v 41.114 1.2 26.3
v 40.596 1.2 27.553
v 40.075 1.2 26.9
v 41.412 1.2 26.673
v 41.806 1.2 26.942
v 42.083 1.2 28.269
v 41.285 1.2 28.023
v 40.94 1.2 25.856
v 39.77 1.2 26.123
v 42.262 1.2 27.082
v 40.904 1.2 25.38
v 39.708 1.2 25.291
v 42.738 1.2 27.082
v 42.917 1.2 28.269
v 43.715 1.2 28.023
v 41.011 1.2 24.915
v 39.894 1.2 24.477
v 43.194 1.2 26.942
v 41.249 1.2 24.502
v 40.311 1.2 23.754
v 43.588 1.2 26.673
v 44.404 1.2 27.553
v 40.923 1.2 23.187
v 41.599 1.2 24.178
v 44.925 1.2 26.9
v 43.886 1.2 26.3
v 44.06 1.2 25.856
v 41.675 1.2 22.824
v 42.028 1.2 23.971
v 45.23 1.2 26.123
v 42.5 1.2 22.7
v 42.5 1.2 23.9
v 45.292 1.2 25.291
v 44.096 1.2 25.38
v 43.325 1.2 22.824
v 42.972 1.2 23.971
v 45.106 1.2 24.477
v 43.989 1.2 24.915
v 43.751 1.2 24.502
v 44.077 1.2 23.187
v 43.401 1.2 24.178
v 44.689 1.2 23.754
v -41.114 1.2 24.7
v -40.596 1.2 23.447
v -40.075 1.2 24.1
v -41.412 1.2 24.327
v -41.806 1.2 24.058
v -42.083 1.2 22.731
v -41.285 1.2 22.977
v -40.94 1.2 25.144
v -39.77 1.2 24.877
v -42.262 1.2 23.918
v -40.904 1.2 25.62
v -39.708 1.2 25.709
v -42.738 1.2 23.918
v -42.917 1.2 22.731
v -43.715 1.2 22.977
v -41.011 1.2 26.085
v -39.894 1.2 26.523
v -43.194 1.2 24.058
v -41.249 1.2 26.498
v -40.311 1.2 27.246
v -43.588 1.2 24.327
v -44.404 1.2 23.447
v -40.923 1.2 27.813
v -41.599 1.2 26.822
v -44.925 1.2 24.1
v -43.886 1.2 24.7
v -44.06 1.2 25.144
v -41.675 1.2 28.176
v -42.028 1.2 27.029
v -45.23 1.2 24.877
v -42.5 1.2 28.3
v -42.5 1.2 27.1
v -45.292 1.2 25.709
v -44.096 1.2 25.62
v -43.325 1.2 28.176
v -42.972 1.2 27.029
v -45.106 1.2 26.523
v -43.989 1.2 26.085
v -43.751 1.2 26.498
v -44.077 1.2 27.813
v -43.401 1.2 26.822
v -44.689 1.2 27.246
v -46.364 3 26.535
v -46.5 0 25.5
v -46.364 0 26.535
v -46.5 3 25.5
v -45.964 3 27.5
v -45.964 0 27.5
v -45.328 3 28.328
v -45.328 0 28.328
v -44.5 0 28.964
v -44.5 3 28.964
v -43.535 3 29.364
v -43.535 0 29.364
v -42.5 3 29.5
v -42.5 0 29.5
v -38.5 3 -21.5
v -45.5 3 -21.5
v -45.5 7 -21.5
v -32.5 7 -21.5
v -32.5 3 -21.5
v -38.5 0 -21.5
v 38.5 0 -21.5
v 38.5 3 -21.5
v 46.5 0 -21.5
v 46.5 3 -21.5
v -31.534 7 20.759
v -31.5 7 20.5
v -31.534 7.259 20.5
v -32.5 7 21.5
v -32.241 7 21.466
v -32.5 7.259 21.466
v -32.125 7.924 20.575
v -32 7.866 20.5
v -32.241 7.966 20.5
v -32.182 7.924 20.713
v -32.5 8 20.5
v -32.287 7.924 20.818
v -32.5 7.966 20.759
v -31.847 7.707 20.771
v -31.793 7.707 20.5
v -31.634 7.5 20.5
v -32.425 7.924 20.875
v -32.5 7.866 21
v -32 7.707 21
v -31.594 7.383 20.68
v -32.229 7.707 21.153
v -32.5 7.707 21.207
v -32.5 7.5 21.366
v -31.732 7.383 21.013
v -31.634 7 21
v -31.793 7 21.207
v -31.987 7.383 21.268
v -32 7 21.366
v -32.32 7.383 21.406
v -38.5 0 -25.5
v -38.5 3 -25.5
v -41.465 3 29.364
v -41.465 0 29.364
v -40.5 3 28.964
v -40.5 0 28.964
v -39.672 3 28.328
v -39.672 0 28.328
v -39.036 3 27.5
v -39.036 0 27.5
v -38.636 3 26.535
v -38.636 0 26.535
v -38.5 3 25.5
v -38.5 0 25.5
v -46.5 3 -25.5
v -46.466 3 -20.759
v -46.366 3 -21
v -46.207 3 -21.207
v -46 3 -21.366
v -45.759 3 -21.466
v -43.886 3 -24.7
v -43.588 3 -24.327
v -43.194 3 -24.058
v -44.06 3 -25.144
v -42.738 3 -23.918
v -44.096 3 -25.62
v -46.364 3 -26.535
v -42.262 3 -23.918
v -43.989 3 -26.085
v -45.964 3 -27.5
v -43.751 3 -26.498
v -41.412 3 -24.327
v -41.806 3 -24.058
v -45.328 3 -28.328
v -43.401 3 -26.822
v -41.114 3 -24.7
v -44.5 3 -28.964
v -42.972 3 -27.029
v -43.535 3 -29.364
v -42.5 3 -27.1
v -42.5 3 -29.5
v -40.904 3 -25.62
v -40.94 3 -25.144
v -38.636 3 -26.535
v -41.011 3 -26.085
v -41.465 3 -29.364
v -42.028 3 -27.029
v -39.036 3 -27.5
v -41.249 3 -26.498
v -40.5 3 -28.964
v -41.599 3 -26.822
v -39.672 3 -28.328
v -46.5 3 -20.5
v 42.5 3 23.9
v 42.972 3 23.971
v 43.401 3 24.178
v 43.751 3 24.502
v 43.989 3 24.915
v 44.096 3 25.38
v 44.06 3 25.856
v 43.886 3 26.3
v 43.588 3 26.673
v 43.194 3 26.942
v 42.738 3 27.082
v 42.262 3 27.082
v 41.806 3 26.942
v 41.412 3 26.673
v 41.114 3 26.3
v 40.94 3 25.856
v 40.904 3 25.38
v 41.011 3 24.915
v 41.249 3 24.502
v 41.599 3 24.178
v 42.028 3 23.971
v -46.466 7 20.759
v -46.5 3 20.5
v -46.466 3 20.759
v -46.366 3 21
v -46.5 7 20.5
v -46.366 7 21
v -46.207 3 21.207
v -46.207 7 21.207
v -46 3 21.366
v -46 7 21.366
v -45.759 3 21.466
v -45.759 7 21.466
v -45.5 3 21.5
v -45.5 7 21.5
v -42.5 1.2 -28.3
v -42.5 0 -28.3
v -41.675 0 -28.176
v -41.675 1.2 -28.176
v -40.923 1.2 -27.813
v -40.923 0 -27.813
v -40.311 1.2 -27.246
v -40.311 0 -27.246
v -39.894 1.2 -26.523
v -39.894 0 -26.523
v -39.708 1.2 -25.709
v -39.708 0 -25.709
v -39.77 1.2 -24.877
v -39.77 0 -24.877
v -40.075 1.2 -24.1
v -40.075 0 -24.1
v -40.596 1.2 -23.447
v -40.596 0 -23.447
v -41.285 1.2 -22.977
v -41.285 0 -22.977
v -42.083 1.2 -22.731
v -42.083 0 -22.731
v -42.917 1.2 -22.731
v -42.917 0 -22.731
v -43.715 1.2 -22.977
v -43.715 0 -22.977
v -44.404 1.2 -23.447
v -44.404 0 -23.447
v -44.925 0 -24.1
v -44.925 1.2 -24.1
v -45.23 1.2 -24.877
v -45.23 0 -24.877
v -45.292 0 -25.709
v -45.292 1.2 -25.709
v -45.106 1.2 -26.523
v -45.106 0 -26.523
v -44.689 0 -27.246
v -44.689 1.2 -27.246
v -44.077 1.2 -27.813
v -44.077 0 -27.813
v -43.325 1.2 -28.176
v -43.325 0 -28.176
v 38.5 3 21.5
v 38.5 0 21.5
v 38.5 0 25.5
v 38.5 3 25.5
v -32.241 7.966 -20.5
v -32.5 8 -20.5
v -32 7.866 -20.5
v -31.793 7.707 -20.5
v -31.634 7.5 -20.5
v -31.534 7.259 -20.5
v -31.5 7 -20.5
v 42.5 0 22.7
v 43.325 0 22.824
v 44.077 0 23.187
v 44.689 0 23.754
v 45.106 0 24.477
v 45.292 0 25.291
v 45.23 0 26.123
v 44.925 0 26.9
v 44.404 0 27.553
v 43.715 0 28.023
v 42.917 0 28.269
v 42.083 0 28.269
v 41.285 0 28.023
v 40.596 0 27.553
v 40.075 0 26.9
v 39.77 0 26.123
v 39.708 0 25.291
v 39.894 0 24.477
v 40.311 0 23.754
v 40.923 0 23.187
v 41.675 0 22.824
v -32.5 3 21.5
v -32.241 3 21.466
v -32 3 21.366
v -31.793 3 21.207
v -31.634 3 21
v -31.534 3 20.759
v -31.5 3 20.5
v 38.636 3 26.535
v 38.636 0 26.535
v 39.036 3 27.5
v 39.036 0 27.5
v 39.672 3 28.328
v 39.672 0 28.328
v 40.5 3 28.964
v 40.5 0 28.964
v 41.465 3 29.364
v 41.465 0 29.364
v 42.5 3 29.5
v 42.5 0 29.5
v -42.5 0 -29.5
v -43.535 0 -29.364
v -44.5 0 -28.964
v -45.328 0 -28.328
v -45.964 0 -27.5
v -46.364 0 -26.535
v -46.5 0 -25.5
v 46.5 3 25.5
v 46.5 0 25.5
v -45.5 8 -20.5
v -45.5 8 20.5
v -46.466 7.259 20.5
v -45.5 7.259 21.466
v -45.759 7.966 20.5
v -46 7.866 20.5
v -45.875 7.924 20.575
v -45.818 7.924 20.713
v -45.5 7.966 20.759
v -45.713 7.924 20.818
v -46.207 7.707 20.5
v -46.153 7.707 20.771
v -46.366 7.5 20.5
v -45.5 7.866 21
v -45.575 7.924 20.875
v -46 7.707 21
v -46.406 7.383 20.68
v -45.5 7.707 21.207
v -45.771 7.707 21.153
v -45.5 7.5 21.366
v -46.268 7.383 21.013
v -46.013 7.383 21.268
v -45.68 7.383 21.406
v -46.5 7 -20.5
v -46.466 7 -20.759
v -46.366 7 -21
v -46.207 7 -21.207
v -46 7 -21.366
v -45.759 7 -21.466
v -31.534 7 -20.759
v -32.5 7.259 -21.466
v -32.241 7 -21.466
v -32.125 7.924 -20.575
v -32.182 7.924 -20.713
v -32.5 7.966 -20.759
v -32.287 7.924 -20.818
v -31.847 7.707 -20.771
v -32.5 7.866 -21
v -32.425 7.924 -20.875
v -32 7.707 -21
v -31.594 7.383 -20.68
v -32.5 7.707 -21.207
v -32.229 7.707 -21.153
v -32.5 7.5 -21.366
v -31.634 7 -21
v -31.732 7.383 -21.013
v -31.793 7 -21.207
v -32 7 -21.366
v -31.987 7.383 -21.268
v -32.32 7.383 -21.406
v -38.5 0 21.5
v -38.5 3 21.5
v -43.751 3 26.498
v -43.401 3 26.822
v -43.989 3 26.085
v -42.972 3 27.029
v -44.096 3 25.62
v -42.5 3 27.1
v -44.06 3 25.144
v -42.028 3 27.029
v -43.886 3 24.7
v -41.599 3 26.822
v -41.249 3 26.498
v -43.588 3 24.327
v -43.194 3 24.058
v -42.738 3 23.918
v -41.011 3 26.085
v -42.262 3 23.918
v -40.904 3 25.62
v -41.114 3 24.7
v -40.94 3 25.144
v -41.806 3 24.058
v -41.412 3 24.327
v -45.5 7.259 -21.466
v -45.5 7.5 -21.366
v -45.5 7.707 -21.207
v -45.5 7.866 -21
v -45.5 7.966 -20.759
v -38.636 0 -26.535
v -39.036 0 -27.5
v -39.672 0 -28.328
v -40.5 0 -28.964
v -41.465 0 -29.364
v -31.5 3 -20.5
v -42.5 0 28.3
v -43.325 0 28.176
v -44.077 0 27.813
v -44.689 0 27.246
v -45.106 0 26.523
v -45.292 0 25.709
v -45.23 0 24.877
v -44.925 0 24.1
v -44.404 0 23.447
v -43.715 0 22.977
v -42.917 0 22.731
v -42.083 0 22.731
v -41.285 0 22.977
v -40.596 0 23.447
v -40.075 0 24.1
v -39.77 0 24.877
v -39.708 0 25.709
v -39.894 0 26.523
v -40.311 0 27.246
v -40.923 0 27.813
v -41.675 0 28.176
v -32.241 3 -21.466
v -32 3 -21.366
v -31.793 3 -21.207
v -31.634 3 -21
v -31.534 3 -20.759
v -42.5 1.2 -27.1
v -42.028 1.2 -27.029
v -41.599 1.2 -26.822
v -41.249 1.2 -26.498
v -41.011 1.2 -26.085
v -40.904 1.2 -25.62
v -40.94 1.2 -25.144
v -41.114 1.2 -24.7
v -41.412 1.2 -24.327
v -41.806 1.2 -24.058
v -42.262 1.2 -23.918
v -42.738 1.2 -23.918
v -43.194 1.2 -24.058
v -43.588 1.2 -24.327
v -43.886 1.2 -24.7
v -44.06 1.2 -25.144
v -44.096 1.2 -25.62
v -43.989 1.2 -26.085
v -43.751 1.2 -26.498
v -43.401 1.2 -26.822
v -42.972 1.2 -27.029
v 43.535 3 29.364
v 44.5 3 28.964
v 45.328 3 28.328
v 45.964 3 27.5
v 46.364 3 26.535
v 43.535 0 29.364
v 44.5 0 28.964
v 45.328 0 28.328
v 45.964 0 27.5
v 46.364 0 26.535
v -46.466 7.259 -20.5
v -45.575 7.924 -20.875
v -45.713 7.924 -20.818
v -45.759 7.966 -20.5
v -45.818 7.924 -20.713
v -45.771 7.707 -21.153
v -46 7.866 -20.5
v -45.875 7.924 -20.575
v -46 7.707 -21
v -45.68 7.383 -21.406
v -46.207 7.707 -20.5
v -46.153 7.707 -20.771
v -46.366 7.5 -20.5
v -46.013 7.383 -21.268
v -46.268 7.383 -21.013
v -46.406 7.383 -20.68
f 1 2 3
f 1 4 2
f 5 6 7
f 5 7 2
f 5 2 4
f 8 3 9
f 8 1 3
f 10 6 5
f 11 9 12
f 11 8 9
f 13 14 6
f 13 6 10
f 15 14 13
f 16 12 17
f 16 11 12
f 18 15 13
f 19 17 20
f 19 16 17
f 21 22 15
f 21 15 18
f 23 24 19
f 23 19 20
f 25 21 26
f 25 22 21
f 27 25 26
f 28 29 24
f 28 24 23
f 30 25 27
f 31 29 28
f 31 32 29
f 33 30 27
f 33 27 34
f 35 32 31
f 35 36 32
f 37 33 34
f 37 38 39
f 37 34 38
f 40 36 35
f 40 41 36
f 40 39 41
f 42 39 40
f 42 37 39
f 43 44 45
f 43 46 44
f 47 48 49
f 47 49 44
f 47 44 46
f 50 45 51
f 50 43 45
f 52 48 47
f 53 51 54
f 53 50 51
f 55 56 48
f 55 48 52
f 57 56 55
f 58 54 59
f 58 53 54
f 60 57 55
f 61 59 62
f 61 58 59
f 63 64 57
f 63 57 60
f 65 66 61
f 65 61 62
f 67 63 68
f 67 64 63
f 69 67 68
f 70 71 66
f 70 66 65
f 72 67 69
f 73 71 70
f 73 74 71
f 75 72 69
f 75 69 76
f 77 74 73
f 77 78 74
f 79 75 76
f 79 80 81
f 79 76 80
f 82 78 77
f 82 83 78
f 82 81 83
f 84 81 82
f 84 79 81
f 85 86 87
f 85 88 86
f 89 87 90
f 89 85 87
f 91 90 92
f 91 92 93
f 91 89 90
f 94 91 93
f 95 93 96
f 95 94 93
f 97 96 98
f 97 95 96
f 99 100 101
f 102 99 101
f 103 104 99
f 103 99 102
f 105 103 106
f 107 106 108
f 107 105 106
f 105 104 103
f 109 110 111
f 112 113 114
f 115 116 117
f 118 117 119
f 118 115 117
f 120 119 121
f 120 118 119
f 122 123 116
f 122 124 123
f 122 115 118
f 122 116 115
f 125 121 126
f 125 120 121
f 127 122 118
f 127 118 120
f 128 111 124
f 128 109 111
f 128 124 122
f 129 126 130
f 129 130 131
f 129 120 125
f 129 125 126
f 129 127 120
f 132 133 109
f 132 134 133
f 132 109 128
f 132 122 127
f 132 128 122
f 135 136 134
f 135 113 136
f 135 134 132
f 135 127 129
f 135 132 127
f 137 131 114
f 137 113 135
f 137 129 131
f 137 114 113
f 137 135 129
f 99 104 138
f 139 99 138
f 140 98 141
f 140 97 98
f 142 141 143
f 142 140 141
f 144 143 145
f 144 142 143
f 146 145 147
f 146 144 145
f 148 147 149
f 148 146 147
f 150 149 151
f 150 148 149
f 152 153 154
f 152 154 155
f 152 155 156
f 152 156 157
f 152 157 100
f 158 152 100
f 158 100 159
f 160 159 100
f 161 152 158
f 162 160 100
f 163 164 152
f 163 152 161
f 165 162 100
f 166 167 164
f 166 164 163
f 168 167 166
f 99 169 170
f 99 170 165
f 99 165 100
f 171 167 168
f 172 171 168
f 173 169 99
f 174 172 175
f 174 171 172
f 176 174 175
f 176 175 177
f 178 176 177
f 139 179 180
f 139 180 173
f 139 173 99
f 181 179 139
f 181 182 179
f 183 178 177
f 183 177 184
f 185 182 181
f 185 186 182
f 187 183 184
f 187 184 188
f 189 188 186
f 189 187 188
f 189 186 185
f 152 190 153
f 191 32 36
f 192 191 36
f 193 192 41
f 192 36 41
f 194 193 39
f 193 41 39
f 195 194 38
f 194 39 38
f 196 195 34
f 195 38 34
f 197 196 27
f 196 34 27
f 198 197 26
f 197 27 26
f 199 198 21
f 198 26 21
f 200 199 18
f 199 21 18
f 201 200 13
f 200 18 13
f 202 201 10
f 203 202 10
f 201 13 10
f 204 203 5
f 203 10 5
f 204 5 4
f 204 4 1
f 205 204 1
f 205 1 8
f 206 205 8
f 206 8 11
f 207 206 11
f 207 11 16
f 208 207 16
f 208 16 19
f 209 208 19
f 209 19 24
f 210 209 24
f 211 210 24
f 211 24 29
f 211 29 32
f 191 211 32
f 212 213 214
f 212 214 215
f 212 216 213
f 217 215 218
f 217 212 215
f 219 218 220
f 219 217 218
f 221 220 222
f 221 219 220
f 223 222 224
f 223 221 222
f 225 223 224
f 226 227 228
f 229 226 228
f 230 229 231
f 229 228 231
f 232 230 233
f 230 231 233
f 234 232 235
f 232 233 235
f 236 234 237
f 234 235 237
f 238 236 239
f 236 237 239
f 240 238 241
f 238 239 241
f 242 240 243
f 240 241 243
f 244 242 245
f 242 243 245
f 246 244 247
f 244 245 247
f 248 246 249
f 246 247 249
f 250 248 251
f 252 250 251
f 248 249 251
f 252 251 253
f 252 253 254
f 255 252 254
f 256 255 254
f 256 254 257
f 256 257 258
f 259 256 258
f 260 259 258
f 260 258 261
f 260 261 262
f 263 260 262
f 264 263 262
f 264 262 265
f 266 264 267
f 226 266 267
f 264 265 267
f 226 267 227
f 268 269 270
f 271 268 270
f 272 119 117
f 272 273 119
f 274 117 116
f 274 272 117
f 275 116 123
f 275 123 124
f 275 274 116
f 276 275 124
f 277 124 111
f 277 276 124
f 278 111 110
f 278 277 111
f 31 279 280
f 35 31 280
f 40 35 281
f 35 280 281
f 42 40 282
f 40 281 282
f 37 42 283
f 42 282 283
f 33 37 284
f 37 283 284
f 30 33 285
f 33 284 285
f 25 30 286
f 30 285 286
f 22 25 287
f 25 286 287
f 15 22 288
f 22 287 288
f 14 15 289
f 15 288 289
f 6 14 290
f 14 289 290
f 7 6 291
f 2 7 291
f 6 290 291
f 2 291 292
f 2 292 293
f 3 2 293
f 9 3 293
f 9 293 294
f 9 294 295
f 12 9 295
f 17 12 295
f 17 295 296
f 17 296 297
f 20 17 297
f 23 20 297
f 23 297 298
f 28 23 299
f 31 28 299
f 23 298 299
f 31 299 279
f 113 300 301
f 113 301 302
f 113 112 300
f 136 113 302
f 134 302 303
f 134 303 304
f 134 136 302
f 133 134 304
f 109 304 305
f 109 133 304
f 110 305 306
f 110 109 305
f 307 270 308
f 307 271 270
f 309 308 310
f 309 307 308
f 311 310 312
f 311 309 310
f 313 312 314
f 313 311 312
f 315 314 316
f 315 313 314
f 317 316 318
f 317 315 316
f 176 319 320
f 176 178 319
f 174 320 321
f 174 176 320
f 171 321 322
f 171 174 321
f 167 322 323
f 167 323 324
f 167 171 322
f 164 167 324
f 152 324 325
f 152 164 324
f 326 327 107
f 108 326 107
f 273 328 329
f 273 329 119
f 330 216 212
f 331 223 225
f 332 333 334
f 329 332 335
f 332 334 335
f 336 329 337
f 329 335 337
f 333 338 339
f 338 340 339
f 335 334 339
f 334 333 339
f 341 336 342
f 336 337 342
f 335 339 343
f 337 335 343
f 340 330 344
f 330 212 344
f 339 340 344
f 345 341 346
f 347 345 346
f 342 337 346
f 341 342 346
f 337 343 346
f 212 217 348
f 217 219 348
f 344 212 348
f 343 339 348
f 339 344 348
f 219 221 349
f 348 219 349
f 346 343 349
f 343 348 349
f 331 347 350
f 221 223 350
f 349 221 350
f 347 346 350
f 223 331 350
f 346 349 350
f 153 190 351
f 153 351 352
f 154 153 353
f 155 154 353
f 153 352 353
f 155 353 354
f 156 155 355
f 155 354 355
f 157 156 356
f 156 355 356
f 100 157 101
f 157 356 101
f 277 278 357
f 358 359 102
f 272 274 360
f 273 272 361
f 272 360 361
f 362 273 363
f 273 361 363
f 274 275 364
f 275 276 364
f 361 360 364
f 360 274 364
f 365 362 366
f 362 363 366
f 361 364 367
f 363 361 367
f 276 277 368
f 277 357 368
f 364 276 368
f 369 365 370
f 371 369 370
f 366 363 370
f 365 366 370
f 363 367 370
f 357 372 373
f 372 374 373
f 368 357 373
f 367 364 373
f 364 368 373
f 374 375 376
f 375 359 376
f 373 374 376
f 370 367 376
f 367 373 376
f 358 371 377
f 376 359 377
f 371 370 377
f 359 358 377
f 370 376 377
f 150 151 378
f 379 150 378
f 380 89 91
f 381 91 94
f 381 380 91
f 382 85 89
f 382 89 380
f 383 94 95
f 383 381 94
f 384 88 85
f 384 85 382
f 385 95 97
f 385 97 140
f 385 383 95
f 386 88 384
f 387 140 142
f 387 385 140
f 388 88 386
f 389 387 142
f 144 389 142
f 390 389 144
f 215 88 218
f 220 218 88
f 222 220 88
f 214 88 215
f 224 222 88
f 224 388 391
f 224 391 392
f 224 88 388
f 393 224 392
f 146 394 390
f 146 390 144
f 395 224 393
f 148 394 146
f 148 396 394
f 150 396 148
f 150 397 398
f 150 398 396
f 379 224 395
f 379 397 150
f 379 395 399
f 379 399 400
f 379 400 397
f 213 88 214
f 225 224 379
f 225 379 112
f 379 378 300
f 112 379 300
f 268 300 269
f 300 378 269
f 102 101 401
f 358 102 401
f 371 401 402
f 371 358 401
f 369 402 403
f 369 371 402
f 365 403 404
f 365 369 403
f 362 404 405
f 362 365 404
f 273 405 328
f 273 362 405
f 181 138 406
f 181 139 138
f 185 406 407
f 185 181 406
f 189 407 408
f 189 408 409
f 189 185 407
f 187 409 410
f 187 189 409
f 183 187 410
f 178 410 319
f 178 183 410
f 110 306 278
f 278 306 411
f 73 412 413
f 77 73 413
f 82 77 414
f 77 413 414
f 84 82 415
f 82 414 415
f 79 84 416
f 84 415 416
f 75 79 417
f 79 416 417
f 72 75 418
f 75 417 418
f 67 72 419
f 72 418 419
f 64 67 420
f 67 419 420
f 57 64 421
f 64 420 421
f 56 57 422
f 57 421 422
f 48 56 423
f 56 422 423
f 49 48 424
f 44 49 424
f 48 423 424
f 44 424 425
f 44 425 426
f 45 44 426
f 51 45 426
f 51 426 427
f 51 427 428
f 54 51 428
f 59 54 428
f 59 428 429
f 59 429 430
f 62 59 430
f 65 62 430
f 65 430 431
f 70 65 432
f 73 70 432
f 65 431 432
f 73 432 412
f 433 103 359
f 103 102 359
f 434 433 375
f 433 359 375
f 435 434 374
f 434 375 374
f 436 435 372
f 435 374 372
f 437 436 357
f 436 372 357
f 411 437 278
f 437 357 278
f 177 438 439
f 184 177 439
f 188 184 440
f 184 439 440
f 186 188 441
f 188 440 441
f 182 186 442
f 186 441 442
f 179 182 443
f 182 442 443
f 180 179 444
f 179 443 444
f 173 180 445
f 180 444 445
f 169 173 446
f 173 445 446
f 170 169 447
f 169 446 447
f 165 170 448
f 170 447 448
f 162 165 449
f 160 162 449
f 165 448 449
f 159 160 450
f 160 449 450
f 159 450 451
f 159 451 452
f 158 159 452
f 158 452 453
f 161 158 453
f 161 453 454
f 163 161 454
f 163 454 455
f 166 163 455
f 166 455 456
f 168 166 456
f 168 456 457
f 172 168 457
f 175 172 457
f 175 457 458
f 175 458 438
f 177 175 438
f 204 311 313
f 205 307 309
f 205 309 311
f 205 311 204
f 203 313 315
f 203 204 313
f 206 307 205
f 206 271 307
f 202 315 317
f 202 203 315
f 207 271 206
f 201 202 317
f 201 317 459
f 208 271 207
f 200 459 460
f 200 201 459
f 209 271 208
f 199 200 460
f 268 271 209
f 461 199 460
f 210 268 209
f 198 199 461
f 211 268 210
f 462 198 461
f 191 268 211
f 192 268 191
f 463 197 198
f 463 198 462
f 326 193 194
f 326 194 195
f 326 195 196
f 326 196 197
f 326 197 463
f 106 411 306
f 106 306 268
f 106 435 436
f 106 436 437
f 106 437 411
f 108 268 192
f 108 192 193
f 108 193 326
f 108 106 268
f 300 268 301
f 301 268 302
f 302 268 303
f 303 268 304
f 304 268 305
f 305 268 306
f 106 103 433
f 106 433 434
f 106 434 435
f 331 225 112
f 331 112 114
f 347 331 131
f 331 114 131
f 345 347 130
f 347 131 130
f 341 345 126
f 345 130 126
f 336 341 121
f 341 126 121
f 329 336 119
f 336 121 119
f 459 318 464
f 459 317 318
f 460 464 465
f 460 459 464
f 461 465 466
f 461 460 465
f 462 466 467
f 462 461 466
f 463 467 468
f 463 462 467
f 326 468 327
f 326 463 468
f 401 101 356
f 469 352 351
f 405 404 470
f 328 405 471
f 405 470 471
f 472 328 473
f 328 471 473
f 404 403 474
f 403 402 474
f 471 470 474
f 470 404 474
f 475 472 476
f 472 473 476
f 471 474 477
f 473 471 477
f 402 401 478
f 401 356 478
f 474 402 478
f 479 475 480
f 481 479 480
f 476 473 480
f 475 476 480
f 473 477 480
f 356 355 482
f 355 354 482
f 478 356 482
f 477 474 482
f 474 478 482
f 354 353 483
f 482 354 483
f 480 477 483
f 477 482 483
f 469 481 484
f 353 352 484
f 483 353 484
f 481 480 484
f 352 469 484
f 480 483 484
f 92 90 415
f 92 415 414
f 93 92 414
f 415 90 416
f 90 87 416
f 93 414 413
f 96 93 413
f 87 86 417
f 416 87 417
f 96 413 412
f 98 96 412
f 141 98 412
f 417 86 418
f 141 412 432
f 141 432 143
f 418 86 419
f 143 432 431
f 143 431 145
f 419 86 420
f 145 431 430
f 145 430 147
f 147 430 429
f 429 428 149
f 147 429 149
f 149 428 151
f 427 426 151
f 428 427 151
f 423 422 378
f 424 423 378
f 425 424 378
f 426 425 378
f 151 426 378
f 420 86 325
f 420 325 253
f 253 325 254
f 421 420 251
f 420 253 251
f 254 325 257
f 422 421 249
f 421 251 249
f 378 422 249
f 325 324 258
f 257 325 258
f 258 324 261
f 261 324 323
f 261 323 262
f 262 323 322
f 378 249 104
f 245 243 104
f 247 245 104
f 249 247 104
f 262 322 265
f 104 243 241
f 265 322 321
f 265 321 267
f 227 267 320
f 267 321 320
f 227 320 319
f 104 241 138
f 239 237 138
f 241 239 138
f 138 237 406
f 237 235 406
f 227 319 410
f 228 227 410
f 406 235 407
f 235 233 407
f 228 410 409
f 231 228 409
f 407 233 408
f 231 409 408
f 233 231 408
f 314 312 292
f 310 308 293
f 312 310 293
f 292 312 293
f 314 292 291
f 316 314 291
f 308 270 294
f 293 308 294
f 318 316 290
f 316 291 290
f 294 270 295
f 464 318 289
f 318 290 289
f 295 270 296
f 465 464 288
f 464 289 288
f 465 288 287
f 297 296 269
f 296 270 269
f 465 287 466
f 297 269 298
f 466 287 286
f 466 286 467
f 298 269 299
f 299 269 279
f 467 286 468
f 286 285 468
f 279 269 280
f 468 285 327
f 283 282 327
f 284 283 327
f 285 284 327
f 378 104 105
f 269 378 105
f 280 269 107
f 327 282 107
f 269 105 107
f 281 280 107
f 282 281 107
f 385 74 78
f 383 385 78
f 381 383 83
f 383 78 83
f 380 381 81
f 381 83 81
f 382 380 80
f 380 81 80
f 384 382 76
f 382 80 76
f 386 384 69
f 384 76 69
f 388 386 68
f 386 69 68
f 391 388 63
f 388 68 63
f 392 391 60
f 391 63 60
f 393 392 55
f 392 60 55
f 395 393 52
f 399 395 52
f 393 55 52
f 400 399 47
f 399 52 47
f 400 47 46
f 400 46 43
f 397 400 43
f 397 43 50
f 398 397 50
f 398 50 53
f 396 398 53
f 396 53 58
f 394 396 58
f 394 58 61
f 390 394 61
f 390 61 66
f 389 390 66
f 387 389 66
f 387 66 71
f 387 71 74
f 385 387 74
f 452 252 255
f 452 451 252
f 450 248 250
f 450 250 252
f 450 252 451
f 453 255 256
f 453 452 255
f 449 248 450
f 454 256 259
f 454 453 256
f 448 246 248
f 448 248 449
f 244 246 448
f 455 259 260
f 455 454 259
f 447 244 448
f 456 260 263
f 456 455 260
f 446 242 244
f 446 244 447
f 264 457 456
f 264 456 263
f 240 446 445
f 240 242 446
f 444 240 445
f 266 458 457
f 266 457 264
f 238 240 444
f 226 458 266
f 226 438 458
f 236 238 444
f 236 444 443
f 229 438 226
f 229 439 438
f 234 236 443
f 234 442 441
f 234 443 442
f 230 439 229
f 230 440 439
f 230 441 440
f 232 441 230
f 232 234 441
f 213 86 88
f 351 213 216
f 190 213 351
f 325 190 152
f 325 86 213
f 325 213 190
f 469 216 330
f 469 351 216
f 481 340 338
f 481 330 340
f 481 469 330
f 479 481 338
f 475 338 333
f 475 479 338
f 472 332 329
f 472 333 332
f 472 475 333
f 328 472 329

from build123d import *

# Parameters (mm, degrees)
EXTRUDE_1_DEPTH     = 3
FILLET_1_R          = 4
SKETCH_2_R          = 1.6
CUT_EXTRUDE_1_DEPTH = 3
SKETCH_3_R          = 2.8
CUT_EXTRUDE_2_DEPTH = 1.2
SKETCH_4_W          = 15
SKETCH_4_H          = 43
EXTRUDE_2_DEPTH     = 5
FILLET_2_R          = 1
SKETCH_5_W          = 21.917819233
SKETCH_5_H          = 11.553011577
CUT_EXTRUDE_3_DEPTH = 10


with BuildPart() as part:
    # 草图1 → 凸台-拉伸1 (new body)
    with BuildSketch(Plane(origin=(0, 0, 0), x_dir=(1, 0, 0), z_dir=(0, 1, 0))):
        Polygon((-38.5, -21.5), (38.5, -21.5), (38.5, -29.5), (46.5, -29.5), (46.5, -21.5), (46.5, 21.5), (46.5, 29.5), (38.5, 29.5), (38.5, 21.5), (-38.5, 21.5), (-38.5, 29.5), (-46.5, 29.5), (-46.5, 21.5), (-46.5, -21.5), (-46.5, -29.5), (-38.5, -29.5), align=None)
    extrude(amount=EXTRUDE_1_DEPTH)

    # 圆角1
    fillet_1_edges = [part.edges().sort_by_distance(p)[0] for p in [
        (38.5, 1.5, 29.5),
        (46.5, 1.5, 29.5),
        (-46.5, 1.5, 29.5),
        (-38.5, 1.5, 29.5),
        (-46.5, 1.5, -29.5),
        (-38.5, 1.5, -29.5),
        (38.5, 1.5, -29.5),
        (46.5, 1.5, -29.5),
    ]]
    fillet(fillet_1_edges, radius=FILLET_1_R - 0.0001)  # a hair under: the kernel refuses the full size

    # 草图2 → 切除-拉伸1 (cut)
    with BuildSketch(Plane.XZ):
        with Locations(Location((42.5, 25.5, 0), (0, 0, 270))):
            Circle(SKETCH_2_R)
        with Locations(Location((42.5, -25.5, 0), (0, 0, 90))):
            Circle(SKETCH_2_R)
        with Locations(Location((-42.5, -25.5, 0), (0, 0, 270))):
            Circle(SKETCH_2_R)
        with Locations(Location((-42.5, 25.5, 0), (0, 0, 90))):
            Circle(SKETCH_2_R)
    extrude(amount=-CUT_EXTRUDE_1_DEPTH, mode=Mode.SUBTRACT)

    # 草图3 → 切除-拉伸2 (cut)
    with BuildSketch(Plane.XZ):
        with Locations(Location((-42.5, 25.5, 0), (0, 0, 90))):
            Circle(SKETCH_3_R)
        with Locations(Location((42.5, 25.5, 0), (0, 0, 270))):
            Circle(SKETCH_3_R)
        with Locations(Location((42.5, -25.5, 0), (0, 0, 90))):
            Circle(SKETCH_3_R)
        with Locations(Location((-42.5, -25.5, 0), (0, 0, 270))):
            Circle(SKETCH_3_R)
    extrude(amount=-CUT_EXTRUDE_2_DEPTH, mode=Mode.SUBTRACT)

    # 草图4 → 凸台-拉伸2 (add)
    with BuildSketch(Plane(origin=(0, 3, 0), x_dir=(1, 0, 0), z_dir=(0, 1, 0))):
        with Locations((-39, 0)):
            Rectangle(SKETCH_4_W, SKETCH_4_H)
    extrude(amount=EXTRUDE_2_DEPTH)

    # 圆角2
    fillet_2_edges = [part.edges().sort_by_distance(p)[0] for p in [
        (-31.5, 5.5, 21.5),
        (-31.5, 5.5, -21.5),
        (-46.5, 5.5, -21.5),
        (-46.5, 5.5, 21.5),
        (-31.5, 8, 0),
        (-39, 8, -21.5),
        (-46.5, 8, 0),
        (-39, 8, 21.5),
    ]]
    fillet(fillet_2_edges, radius=FILLET_2_R)

    # 草图5 → 切除-拉伸3 (cut)
    with BuildSketch(Plane.XZ):
        with Locations((42.014050272, -27.276505788)):
            Rectangle(SKETCH_5_W, SKETCH_5_H)
    extrude(amount=-CUT_EXTRUDE_3_DEPTH, mode=Mode.SUBTRACT)


solid = part.part
